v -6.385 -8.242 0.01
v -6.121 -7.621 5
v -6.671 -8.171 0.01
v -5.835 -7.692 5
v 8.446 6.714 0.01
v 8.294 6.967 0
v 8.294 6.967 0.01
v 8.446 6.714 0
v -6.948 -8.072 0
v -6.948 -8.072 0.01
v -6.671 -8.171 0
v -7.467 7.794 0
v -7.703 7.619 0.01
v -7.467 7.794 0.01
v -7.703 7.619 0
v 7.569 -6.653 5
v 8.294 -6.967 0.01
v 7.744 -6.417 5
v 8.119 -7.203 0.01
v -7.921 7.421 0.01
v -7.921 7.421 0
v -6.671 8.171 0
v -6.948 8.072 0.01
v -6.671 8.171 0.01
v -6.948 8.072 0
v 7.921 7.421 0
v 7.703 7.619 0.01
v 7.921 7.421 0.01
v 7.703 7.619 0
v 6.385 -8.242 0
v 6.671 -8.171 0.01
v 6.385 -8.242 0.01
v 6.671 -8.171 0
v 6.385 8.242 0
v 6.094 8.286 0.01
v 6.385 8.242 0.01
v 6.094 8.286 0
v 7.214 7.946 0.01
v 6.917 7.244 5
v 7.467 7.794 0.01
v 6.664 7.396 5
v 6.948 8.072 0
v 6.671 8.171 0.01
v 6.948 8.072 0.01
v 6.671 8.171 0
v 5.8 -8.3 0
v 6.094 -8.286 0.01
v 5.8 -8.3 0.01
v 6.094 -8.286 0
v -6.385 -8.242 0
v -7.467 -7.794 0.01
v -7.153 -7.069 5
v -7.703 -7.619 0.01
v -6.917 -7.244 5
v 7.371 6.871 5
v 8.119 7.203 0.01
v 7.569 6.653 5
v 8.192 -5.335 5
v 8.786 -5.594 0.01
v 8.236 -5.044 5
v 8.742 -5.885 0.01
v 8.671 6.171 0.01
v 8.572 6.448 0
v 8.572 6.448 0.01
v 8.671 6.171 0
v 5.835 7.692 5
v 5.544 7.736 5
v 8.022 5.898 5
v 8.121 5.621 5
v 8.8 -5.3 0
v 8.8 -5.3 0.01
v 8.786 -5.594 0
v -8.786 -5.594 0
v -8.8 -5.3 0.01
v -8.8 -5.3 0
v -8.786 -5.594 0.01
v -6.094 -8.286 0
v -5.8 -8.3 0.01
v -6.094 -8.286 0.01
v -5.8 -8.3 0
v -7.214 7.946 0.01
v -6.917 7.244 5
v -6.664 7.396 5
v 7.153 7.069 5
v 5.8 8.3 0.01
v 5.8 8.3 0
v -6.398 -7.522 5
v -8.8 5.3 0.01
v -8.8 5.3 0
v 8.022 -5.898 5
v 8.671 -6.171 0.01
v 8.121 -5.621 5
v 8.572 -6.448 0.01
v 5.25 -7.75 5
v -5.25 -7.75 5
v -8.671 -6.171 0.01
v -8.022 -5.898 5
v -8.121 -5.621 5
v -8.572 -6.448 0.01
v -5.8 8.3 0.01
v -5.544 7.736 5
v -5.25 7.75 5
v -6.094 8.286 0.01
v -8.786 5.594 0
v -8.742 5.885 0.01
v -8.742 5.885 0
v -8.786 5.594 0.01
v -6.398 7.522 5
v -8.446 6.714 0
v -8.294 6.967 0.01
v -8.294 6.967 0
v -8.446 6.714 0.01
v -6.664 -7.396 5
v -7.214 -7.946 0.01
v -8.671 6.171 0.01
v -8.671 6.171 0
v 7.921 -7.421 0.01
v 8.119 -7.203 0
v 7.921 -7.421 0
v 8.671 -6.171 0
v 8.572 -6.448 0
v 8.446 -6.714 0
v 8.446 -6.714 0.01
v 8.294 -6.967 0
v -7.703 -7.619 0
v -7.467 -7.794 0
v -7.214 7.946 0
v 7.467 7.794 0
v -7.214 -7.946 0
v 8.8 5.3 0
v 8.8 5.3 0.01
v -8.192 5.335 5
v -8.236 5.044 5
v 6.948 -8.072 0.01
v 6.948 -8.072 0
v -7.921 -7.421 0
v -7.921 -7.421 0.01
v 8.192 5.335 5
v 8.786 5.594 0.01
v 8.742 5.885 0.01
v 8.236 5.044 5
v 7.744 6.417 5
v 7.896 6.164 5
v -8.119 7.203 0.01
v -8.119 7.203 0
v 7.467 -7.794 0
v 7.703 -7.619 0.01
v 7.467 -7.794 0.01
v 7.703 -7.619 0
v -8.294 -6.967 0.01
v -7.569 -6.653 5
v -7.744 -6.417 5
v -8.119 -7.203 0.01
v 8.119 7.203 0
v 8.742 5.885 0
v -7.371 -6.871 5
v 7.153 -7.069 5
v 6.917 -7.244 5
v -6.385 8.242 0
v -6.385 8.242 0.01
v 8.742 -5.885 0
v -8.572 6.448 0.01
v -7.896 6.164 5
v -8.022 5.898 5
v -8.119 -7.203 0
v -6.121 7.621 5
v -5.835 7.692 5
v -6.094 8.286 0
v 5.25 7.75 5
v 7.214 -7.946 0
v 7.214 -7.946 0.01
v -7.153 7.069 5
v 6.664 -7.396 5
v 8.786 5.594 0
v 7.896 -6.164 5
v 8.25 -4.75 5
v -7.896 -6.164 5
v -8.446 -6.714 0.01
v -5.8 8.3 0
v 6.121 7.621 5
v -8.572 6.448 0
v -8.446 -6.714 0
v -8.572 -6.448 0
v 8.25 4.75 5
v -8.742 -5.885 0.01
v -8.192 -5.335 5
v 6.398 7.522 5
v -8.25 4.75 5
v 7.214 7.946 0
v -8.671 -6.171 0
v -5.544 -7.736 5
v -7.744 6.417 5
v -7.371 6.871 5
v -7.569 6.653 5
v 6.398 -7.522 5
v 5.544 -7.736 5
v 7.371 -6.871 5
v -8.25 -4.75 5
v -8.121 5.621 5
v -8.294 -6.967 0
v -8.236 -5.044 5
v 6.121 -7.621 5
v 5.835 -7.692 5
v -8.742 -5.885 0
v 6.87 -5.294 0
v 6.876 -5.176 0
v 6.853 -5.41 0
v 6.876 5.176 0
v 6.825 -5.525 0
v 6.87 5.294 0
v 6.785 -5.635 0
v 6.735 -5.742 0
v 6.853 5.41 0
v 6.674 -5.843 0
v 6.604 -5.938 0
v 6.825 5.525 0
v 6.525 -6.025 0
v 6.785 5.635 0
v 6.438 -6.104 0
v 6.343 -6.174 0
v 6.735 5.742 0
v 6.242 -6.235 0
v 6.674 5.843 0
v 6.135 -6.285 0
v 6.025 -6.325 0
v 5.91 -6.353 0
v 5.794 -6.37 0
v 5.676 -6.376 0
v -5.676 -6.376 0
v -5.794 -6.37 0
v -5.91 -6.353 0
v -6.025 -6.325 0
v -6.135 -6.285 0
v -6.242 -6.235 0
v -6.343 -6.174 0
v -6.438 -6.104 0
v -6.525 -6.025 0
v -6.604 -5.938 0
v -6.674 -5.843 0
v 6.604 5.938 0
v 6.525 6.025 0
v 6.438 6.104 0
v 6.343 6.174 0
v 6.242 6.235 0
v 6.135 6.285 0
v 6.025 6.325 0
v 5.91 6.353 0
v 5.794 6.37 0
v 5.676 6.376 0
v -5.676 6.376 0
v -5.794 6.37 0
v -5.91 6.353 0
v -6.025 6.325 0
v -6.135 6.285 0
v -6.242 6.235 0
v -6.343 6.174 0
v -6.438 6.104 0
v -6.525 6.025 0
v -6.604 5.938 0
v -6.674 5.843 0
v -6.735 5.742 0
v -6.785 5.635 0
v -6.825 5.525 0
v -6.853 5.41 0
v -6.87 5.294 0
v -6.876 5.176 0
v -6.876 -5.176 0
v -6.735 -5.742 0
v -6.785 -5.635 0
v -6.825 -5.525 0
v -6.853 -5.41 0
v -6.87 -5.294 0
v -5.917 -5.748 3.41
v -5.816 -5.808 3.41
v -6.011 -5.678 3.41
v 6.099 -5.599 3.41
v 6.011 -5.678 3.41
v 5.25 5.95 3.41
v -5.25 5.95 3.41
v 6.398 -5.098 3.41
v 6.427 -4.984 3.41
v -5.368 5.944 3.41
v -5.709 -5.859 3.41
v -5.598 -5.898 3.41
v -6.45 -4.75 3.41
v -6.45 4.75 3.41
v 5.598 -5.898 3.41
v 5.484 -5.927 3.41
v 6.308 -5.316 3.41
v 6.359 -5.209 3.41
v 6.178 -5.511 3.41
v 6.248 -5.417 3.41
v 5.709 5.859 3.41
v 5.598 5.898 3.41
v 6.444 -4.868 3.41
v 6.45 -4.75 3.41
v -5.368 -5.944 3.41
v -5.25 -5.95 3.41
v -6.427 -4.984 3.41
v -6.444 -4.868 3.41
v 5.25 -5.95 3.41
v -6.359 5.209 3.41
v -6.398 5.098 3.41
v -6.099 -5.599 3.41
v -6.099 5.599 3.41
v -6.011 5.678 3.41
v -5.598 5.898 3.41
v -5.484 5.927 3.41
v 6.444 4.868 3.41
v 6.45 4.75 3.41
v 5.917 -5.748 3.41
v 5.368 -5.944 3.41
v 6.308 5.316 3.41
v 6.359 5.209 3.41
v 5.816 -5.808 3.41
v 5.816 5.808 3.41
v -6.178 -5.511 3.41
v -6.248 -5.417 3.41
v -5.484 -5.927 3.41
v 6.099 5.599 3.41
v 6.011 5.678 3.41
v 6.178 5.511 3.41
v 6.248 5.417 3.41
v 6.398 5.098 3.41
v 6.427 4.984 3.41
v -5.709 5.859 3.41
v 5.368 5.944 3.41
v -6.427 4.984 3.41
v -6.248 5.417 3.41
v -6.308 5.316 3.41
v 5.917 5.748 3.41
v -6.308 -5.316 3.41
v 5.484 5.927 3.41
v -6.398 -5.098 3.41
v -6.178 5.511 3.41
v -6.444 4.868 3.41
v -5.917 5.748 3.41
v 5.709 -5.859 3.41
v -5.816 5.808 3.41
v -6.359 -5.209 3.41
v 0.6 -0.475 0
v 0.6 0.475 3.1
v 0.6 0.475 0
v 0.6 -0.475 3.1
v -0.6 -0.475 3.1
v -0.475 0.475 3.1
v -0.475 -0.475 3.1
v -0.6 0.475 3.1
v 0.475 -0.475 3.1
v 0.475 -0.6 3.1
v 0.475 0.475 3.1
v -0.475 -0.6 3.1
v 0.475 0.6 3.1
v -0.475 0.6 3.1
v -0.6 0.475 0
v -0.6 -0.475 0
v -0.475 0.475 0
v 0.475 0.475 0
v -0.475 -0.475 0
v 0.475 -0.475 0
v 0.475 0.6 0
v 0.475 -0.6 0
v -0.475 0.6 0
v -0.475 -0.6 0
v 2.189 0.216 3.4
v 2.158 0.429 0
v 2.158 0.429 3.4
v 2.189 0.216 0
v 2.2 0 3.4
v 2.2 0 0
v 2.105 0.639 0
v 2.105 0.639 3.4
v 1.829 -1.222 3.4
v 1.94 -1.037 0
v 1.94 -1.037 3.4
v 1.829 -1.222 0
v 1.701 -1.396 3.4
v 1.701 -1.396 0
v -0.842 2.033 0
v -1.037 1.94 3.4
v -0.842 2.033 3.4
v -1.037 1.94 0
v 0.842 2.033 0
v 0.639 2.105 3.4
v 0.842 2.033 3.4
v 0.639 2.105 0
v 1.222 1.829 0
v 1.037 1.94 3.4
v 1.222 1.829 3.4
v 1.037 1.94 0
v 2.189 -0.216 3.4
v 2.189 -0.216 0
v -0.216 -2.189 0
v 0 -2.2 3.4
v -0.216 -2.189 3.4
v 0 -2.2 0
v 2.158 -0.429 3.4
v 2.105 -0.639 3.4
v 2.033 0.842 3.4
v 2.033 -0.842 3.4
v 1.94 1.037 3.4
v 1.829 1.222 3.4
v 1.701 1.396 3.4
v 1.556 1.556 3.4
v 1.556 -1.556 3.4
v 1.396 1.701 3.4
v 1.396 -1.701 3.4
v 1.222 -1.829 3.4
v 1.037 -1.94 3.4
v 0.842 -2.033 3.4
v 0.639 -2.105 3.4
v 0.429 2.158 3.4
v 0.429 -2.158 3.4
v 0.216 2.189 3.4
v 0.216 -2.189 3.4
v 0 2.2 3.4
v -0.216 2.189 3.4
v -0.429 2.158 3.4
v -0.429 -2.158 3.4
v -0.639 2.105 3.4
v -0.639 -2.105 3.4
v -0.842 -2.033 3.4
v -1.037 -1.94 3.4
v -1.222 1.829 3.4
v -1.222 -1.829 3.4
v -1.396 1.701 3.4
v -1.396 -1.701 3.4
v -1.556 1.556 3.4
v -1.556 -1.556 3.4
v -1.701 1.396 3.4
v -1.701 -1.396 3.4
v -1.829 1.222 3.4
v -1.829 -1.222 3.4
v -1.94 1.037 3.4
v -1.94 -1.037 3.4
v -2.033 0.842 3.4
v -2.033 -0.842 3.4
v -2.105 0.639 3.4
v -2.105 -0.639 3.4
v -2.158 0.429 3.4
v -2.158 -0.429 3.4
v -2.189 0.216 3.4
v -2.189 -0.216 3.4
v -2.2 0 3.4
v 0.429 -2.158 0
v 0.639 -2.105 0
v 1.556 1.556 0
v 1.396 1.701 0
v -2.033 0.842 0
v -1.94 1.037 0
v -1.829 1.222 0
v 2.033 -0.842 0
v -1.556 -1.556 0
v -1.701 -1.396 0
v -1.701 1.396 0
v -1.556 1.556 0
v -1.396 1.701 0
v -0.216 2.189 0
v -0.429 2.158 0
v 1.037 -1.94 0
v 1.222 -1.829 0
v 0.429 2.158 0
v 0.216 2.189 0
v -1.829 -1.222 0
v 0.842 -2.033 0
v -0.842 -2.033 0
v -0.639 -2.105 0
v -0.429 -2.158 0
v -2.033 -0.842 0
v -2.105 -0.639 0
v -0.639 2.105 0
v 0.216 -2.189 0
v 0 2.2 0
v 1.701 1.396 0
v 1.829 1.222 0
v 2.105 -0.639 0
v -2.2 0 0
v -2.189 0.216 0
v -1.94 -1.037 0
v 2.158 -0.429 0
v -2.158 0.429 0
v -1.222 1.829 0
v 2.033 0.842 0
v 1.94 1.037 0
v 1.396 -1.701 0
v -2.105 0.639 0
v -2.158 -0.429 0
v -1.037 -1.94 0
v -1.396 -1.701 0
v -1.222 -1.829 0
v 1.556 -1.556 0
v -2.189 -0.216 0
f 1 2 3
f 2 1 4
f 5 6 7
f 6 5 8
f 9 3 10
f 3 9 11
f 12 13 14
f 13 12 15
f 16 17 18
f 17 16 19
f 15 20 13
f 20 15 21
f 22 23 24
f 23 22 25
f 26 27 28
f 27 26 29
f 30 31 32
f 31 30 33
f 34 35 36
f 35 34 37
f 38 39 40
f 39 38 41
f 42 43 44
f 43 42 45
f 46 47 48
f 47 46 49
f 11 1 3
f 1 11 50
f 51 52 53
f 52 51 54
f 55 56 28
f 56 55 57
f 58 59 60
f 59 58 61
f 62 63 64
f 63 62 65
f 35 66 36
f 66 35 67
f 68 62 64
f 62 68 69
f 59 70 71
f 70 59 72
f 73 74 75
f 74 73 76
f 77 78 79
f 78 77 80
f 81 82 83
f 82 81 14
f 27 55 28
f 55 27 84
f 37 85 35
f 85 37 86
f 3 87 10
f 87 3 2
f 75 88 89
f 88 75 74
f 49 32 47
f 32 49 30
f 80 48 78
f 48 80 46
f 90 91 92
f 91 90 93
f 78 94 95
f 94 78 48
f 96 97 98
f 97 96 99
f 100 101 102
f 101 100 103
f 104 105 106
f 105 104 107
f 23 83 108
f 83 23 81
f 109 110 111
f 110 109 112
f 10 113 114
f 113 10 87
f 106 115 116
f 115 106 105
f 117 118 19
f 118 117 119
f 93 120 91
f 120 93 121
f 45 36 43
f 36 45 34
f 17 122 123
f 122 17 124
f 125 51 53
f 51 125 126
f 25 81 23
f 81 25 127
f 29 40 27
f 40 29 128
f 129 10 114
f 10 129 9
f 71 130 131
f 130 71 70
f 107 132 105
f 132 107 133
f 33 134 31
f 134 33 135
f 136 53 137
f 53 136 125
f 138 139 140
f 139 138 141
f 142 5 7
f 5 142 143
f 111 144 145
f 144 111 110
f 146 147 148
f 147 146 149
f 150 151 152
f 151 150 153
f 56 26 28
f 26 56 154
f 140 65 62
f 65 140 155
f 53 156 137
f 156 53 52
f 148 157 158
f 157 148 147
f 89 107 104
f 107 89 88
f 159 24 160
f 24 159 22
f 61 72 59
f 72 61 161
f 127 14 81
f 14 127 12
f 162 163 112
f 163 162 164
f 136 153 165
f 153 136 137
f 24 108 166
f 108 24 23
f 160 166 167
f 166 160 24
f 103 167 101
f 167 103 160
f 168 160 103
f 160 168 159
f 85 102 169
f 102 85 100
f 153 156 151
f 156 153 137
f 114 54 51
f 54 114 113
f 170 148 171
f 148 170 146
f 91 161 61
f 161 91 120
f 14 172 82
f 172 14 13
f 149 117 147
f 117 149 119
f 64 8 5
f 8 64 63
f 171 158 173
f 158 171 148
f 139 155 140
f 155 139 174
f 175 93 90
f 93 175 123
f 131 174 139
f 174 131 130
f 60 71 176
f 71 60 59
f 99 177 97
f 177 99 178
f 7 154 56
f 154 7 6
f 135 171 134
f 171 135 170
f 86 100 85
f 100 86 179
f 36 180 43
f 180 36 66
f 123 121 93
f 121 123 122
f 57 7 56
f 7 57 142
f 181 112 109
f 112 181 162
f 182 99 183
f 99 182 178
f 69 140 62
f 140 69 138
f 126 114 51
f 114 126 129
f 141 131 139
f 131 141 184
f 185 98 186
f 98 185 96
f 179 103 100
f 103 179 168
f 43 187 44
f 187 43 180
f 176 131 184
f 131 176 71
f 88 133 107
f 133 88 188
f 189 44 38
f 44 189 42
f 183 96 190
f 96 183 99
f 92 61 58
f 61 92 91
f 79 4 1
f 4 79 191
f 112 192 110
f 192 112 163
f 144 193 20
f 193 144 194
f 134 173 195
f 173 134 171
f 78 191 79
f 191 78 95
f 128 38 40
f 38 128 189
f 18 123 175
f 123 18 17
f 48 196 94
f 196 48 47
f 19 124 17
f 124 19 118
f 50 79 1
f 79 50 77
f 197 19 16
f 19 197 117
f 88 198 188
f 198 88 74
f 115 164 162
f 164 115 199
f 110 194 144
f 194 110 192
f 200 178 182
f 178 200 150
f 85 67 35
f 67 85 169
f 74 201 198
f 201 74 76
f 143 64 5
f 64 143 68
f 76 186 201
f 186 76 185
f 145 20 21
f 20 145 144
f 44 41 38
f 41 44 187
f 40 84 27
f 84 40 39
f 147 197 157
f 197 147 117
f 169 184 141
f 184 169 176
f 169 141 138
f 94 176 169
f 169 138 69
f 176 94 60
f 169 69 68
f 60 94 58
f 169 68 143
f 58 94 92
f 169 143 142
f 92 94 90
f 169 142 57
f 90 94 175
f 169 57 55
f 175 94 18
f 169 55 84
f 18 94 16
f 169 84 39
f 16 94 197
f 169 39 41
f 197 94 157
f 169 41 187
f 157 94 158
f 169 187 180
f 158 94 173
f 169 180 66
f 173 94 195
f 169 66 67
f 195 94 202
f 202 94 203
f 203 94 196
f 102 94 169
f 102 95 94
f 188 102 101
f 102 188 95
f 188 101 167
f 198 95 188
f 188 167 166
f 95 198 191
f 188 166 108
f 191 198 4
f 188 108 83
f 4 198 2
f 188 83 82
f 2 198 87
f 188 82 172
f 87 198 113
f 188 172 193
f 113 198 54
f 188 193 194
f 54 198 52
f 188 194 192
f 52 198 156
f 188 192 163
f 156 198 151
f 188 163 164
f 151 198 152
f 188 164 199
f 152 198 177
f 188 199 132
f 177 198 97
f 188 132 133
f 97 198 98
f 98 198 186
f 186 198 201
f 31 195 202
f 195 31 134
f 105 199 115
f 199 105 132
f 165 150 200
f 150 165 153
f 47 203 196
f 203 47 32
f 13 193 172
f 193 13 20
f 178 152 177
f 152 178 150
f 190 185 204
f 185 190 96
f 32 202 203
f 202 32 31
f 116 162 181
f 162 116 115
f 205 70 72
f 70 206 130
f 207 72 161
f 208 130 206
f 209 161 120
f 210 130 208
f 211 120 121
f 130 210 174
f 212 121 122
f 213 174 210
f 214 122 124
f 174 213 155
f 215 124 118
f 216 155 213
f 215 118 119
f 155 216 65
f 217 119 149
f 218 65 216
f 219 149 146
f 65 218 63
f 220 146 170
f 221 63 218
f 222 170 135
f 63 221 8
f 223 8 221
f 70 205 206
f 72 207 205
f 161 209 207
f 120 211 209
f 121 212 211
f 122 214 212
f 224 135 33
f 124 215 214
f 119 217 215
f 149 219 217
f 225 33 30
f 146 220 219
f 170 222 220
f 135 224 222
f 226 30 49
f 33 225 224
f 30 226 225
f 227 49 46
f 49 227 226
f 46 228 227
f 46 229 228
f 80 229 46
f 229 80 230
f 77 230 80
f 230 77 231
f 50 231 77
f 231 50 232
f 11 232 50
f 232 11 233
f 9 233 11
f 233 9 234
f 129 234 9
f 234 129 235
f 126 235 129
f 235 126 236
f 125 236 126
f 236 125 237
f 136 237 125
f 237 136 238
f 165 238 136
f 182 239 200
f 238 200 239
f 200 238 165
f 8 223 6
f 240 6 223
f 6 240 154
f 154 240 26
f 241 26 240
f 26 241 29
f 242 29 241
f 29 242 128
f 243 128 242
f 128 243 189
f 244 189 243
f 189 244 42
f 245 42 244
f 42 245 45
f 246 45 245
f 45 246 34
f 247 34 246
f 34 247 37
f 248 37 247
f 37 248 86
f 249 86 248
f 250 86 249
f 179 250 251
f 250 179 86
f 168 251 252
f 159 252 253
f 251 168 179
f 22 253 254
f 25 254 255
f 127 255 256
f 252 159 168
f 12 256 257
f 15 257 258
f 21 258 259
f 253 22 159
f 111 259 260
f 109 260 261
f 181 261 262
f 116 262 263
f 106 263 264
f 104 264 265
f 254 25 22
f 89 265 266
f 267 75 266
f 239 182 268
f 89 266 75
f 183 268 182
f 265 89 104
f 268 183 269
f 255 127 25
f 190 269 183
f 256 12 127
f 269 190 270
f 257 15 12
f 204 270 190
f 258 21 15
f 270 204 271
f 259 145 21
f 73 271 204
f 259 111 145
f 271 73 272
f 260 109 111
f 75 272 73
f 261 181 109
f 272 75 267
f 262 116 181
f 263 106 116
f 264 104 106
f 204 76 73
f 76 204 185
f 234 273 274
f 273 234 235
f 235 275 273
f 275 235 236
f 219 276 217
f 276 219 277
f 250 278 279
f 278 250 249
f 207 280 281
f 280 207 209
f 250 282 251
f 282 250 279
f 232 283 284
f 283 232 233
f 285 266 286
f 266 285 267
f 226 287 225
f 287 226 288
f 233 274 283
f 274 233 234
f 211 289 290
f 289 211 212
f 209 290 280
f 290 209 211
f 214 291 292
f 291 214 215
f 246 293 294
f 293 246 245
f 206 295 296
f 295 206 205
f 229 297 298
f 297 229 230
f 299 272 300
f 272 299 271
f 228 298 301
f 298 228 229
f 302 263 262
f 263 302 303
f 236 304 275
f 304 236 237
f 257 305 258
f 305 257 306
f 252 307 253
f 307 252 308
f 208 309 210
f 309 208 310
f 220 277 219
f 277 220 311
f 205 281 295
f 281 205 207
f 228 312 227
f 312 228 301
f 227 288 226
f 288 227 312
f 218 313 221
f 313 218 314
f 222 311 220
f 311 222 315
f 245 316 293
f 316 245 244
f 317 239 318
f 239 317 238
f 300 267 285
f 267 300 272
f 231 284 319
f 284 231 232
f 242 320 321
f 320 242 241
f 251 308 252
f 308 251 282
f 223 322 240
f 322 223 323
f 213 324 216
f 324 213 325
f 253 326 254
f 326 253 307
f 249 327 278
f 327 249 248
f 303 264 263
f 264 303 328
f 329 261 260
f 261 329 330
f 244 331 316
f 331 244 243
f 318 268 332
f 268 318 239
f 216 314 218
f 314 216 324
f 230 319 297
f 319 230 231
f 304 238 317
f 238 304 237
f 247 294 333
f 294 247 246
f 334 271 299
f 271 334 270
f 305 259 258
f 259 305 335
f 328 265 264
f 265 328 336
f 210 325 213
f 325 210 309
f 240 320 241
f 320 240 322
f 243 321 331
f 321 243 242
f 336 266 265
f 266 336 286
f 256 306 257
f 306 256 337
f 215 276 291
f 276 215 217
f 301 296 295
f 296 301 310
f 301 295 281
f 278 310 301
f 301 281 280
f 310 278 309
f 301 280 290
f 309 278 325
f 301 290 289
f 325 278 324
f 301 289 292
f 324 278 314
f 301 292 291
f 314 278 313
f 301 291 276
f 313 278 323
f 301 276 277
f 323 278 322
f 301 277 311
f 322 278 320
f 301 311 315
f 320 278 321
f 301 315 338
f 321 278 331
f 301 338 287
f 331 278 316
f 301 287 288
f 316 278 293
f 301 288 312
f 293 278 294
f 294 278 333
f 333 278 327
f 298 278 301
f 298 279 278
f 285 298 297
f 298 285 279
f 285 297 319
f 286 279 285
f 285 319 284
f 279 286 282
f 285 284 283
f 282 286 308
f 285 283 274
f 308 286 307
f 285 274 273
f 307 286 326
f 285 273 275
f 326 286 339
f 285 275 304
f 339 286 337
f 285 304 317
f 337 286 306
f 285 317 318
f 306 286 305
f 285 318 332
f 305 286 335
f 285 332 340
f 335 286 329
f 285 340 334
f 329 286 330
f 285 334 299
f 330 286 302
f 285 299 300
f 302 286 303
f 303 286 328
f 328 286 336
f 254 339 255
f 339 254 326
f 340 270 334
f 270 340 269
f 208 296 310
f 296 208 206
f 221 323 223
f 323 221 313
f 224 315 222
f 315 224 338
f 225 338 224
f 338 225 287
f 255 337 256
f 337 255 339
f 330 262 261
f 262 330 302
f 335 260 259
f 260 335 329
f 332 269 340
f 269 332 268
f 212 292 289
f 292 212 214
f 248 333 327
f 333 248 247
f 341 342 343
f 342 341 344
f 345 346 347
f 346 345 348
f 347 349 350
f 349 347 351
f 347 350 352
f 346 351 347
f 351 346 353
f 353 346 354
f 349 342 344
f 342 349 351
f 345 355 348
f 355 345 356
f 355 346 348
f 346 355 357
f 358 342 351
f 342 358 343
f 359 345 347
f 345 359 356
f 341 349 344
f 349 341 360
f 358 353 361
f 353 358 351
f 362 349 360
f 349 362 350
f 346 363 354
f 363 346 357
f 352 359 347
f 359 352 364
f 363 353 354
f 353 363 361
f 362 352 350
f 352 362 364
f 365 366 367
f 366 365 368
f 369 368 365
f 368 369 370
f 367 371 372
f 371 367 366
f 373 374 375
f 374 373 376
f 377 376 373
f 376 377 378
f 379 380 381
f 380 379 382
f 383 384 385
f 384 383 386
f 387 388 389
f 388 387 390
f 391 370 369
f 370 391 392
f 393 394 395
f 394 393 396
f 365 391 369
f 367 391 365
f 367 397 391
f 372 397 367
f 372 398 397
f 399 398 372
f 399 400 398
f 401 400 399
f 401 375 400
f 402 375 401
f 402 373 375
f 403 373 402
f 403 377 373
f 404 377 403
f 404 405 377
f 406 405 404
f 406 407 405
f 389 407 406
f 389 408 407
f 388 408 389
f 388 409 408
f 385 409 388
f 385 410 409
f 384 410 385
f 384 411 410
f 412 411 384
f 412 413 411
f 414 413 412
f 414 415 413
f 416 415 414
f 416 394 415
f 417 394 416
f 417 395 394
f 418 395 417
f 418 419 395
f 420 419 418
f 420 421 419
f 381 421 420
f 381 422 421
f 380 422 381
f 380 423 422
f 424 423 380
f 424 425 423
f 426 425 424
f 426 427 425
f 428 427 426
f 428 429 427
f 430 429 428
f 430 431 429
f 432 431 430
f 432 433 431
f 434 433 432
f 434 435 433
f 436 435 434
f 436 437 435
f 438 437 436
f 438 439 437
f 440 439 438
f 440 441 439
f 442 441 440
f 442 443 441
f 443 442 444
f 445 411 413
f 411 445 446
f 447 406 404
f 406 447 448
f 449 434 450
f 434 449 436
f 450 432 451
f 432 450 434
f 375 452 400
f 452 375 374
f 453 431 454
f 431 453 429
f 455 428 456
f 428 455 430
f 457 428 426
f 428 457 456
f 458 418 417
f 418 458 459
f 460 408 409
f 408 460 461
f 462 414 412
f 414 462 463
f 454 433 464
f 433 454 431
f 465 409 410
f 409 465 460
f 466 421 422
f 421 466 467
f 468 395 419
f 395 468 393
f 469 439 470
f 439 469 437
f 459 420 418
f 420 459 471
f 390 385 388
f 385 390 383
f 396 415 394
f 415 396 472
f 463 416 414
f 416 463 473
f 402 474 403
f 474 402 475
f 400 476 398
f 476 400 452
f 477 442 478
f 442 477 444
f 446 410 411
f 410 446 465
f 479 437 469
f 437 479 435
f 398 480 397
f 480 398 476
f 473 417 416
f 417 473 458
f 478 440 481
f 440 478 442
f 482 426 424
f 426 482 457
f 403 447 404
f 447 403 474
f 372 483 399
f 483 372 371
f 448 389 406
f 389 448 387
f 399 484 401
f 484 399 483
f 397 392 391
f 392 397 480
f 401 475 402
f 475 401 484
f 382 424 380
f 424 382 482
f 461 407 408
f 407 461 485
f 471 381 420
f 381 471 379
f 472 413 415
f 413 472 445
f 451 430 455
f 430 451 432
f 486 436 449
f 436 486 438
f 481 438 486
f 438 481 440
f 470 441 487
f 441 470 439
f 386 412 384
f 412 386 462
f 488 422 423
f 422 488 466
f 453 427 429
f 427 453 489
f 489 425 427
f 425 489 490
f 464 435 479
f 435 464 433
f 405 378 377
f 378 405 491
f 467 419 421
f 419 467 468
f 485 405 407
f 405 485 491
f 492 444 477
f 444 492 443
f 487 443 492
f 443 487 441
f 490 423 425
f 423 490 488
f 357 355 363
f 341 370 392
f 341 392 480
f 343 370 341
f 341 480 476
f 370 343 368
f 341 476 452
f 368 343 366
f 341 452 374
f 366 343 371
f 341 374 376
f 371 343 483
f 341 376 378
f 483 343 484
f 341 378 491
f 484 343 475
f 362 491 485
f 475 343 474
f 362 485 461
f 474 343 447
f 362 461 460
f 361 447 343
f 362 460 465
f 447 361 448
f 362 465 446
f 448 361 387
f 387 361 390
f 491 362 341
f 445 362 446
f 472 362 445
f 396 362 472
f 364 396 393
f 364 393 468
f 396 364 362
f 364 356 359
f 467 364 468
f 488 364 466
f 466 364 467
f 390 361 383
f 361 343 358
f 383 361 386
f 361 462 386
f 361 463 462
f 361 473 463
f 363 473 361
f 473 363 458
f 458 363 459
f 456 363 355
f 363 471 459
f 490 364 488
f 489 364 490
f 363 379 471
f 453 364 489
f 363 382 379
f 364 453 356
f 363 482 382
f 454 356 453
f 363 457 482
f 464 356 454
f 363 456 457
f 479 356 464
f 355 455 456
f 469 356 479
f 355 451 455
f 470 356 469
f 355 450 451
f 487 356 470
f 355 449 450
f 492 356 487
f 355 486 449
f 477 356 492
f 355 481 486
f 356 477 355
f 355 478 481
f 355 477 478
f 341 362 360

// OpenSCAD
// file: parts.scad
// =============================================================================
// ClaudePad · 零件模块（由 params.scad 提供尺寸）
// =============================================================================

// ---- 底座 -------------------------------------------------------------------
module case_shell() {
    difference() {
        translate([CASE_W / 2, CASE_D / 2, 0])
            linear_extrude(height = CASE_H)
                rrect(CASE_W, CASE_D, CASE_RADIUS);

        translate([CASE_W / 2, CASE_D / 2, CASE_BOTTOM_T])
            linear_extrude(height = CASE_H + 1)
                rrect(CASE_W - 2 * CASE_WALL, CASE_D - 2 * CASE_WALL,
                      CASE_RADIUS - CASE_WALL);

        translate([XIAO_RECESS_X0, XIAO_RECESS_Y0, XIAO_RECESS_Z0])
            cube([XIAO_RECESS_X1 - XIAO_RECESS_X0,
                  XIAO_RECESS_Y1 - XIAO_RECESS_Y0,
                  XIAO_RECESS_Z1 - XIAO_RECESS_Z0]);

        translate([USB_SLOT_X0, -0.1, USB_SLOT_Z0])
            cube([USB_SLOT_X1 - USB_SLOT_X0, 1.6,
                  USB_SLOT_Z1 - USB_SLOT_Z0]);

        for (f = FOOT_POS)
            translate([f[0], f[1], -0.1]) cylinder(d = 8.0, h = 1.2);
    }
}

module plate_ledges() {
    z0 = PLATE_BOT_Z - PLATE_T;
    translate([CASE_WALL - 0.5, PLATE_Y0, z0])
        cube([2.5, PLATE_D, PLATE_T]);
    translate([CASE_W - CASE_WALL - 2.0, PLATE_Y0, z0])
        cube([2.5, PLATE_D, PLATE_T]);
    translate([CASE_WALL, CASE_D - CASE_WALL - 2.0, z0])
        cube([CASE_W - 2 * CASE_WALL, 2.5, PLATE_T]);
}

module screw_posts() {
    for (p = SCREW_POS)
        translate([p[0], p[1], CASE_BOTTOM_T - 0.5])
            cylinder(d = POST_D, h = PLATE_BOT_Z - CASE_BOTTOM_T + 0.5);
}

module pcb_supports() {
    for (p = SUPPORT_POS)
        translate([p[0], p[1], CASE_BOTTOM_T - 0.5])
            cylinder(d = SUPPORT_D, h = SUPPORT_H + 0.5);
}

module battery_walls() {
    z0 = CASE_BOTTOM_T - 0.5;
    h = BATT_WALL_H + 0.5;
    // 左
    translate([BATT_X0 - 2.0, BATT_Y0 - 1.5, z0])
        cube([BATT_WALL, BATT_L + 3.0, h]);
    // 右（中间留走线缺口）
    translate([BATT_X0 + BATT_W + 0.4, BATT_Y0 - 1.5, z0])
        cube([BATT_WALL, 12.5, h]);
    translate([BATT_X0 + BATT_W + 0.4, BATT_Y0 + 14.5, z0])
        cube([BATT_WALL, BATT_L - 10.0, h]);
    // 后
    translate([BATT_X0 - 2.0, BATT_Y0 - 1.5, z0])
        cube([BATT_W + 4.0, BATT_WALL, h]);
    // 前
    translate([BATT_X0 - 2.0, BATT_Y0 + BATT_L, z0])
        cube([BATT_W + 4.0, BATT_WALL, h]);
}

module case_bottom() {
    difference() {
        union() {
            case_shell();
            plate_ledges();
            screw_posts();
            pcb_supports();
            battery_walls();
        }
        for (p = SCREW_POS)
            translate([p[0], p[1], 7.0])
                cylinder(d = PILOT_D, h = PLATE_BOT_Z - 7.0 + 0.2);
    }
}

// ---- 定位板 -----------------------------------------------------------------
module plate() {
    difference() {
        translate([PLATE_X0 + PLATE_W / 2, PLATE_Y0 + PLATE_D / 2, PLATE_BOT_Z])
            linear_extrude(height = PLATE_T)
                rrect(PLATE_W, PLATE_D, PLATE_RADIUS);

        for (s = SWITCHES)
            translate([s[0], s[1], PLATE_BOT_Z + PLATE_T / 2])
                choc_cutout();

        for (p = SCREW_POS)
            translate([p[0], p[1], PLATE_BOT_Z - 1])
                cylinder(d = SCREW_CLEAR, h = PLATE_T + 2);
    }
}

// ---- 键帽 -------------------------------------------------------------------
module cross_stem_socket() {
    union() {
        translate([-CAP_STEM_W / 2, -CAP_STEM_GAP / 2, 0])
            cube([CAP_STEM_W, CAP_STEM_GAP, CAP_STEM_DEPTH]);
        translate([-CAP_STEM_GAP / 2, -CAP_STEM_W / 2, 0])
            cube([CAP_STEM_GAP, CAP_STEM_W, CAP_STEM_DEPTH]);
    }
}

module cap_shell(u) {
    outer_w = PITCH_X * u - 0.4;
    outer_d = PITCH_Y - 0.4;
    top_w = outer_w - CAP_TAPER * 2;
    top_d = outer_d - CAP_TAPER * 2;
    r_out = min(CAP_TOP_R, min(outer_w, outer_d) / 2 - 0.1);
    r_in = max(r_out - CAP_WALL, 0.2);

    difference() {
        hull() {
            linear_extrude(height = 0.01) rrect(outer_w, outer_d, r_out);
            translate([0, 0, CAP_H - CAP_TOP_T])
                linear_extrude(height = CAP_TOP_T) rrect(top_w, top_d, r_out);
        }
        hull() {
            translate([0, 0, -1])
                linear_extrude(height = 0.01)
                    rrect(outer_w - CAP_WALL * 2, outer_d - CAP_WALL * 2, r_in);
            translate([0, 0, CAP_H - CAP_TOP_T])
                linear_extrude(height = 0.01)
                    rrect(top_w - CAP_WALL * 2, top_d - CAP_WALL * 2, r_in);
        }
    }
}

module stem_boss() {
    h = CAP_H - CAP_TOP_T;
    difference() {
        cylinder(d = CAP_STEM_W * 2 + 2.0, h = h);
        translate([0, 0, -0.5]) cross_stem_socket();
    }
}

module cap_ribs(u) {
    if (u >= 2) {
        outer_w = PITCH_X * u - 0.4;
        outer_d = PITCH_Y - 0.4;
        n = (u == 2) ? CAP_RIB_COUNT_MED : CAP_RIB_COUNT_LONG;
        for (i = [1 : n]) {
            translate([
                -outer_w / 2 + outer_w * i / (n + 1) - CAP_RIB_T / 2,
                -outer_d / 2 + CAP_WALL,
                0
            ]) cube([CAP_RIB_T, outer_d - CAP_WALL * 2, CAP_H - CAP_TOP_T]);
        }
    }
}

module keycap(u = 1) {
    union() {
        cap_shell(u);
        for (i = [0 : axis_count(u) - 1])
            translate([stem_offset(u, i), 0, 0]) stem_boss();
        cap_ribs(u);
    }
}
// file: params.scad
// =============================================================================
// ClaudePad · 全局参数（PCB / 定位板 / 外壳 / 键帽共用）
// 单位：mm；坐标与 pcb/generate_pcb.py 完全一致（绝对坐标）
// =============================================================================

// ---- PCB / 按键网格 ---------------------------------------------------------
PCB_X0 = 9.0;
PCB_Y0 = 3.0;
PCB_W = 90.0;
PCB_D = 76.0;
PCB_T = 1.6;
PCB_TOP_Z = 8.6;          // 底板 2.0 + 支撑 5.0 + PCB 1.6
PCB_BOT_Z = 7.0;

PITCH_X = 18.0;
PITCH_Y = 17.0;
KEY_X = [18.0, 36.0, 54.0, 72.0, 90.0];
KEY_Y = [30.5, 47.5, 64.5];

// 14 个实体轴位（ENTER/Space 多轴并联）
SWITCHES = [
    [18.0, 30.5], [36.0, 30.5], [54.0, 30.5], [72.0, 30.5], [90.0, 30.5],
    [18.0, 47.5], [54.0, 47.5], [72.0, 47.5], [90.0, 47.5],
    [18.0, 64.5], [36.0, 64.5], [54.0, 64.5], [72.0, 64.5], [90.0, 64.5]
];

// 11 个键帽：[cx, cy, 宽度u, 名称]
KEYCAPS = [
    [18.0, 30.5, 1, "PERM"], [36.0, 30.5, 1, "MODEL"], [54.0, 30.5, 1, "CMD"],
    [72.0, 30.5, 1, "UP"], [90.0, 30.5, 1, "VOICE"],
    [18.0, 47.5, 1, "STOP"], [54.0, 47.5, 1, "LEFT"], [72.0, 47.5, 1, "DOWN"],
    [90.0, 47.5, 1, "RIGHT"],
    [27.0, 64.5, 2, "ENTER"], [72.0, 64.5, 3, "SPACE"]
];

// ---- 轴体 / 定位板 ---------------------------------------------------------
SWITCH_CUTOUT = 14.5;     // Choc V2 方孔（kiswitch footprint Eco1.User = 14.5）
SWITCH_CUTOUT_TOL = 0.1;
SWITCH_CLIP_W = 2.6;      // 侧卡扣槽
SWITCH_CLIP_H = 1.9;
SWITCH_TRAVEL = 3.0;
SWITCH_TOP_ABOVE_PCB = 8.0; // 轴芯顶面相对 PCB 顶部

PLATE_T = 1.2;
PLATE_X0 = 3.0;
PLATE_Y0 = 22.0;
PLATE_W = 102.0;
PLATE_D = 57.0;
PLATE_RADIUS = 3.0;

// PCB 顶面 → 定位板底面。唯一需要实物校准的参数。
// 先打印 test_coupon.scad，实测 3.50 / 4.25 / 5.00 哪个最贴合。
SWITCH_PLATE_GAP = 5.0;
PLATE_BOT_Z = PCB_TOP_Z + SWITCH_PLATE_GAP;   // 13.6
PLATE_TOP_Z = PLATE_BOT_Z + PLATE_T;          // 14.8

// ---- 外壳 -------------------------------------------------------------------
CASE_W = 108.0;
CASE_D = 82.0;
CASE_WALL = 2.4;
CASE_BOTTOM_T = 2.0;
CASE_RADIUS = 3.0;
CASE_H = PLATE_TOP_Z;                          // 14.8（定位板顶面与外沿齐平）

SCREW_POS = [[6.0, 25.0], [102.0, 25.0], [6.0, 76.0], [102.0, 76.0]];
SCREW_CLEAR = 2.3;
POST_D = 5.0;
PILOT_D = 1.7;

SUPPORT_POS = [[27.0, 39.0], [81.0, 39.0], [27.0, 56.0], [81.0, 56.0]];
SUPPORT_D = 4.0;
SUPPORT_H = PCB_BOT_Z - CASE_BOTTOM_T;         // 5.0

FOOT_POS = [[10.0, 8.0], [98.0, 8.0], [10.0, 74.0], [98.0, 74.0]];

// ---- 电池仓（PCB 下方）------------------------------------------------------
// 电池放在控制器仓下方（PCB 下面），避开键区背面的 DO-35 二极管
BATT_W = 30.0;
BATT_L = 20.0;
BATT_H = 3.0;             // 302030 锂电，带保护板
BATT_X0 = 10.0;
BATT_Y0 = 3.0;
BATT_WALL = 1.6;
BATT_WALL_H = 4.0;        // 1.5..6.0，PCB 底面 7.0，留 1.0

// ---- XIAO / 电池连接器 ------------------------------------------------------
XIAO_X = 54.0;
XIAO_Y = 12.0;
XIAO_W = 21.0;
XIAO_D = 17.8;
XIAO_H = 3.2;
// XIAO 用 2x7 2.54mm 排针穿孔安装，模块被抬高 HEADER_H。
// PCB 顶面 8.6 + 2.5 = 模块底面 11.1；USB-C 中心约 12.7。
HEADER_H = 2.5;
XIAO_RECESS_X0 = 42.0;
XIAO_RECESS_X1 = 66.0;
XIAO_RECESS_Y0 = 1.4;
XIAO_RECESS_Y1 = 2.6;
XIAO_RECESS_Z0 = 10.5;
XIAO_RECESS_Z1 = 14.3;
USB_SLOT_X0 = 48.5;
USB_SLOT_X1 = 59.5;
USB_SLOT_Z0 = 10.5;
USB_SLOT_Z1 = 14.3;

JST_X = 74.0;
JST_Y = 12.0;
CABLE_SLOT = [83.5, 10.0, 87.5, 18.0];

// ---- 键帽 -------------------------------------------------------------------
CAP_GAP = 3.3;            // 定位板顶面 → 键帽裙边底面（≥ SWITCH_TRAVEL）
CAP_H = 5.0;
CAP_WALL = 1.8;
CAP_TOP_T = 1.6;
CAP_TAPER = 0.55;
CAP_STEM_W = 1.2;
CAP_STEM_GAP = 0.95;
CAP_STEM_DEPTH = 3.6;
CAP_TOP_R = 3.0;
CAP_RIB_T = 1.2;
CAP_RIB_COUNT_MED = 1;
CAP_RIB_COUNT_LONG = 3;

TOTAL_H = PLATE_TOP_Z + CAP_GAP + CAP_H;       // 23.1

$fn = 64;

// ---- 通用函数 ---------------------------------------------------------------
module rrect(w, d, r) {
    offset(r = r) offset(delta = -r) square([w, d], center = true);
}

function axis_count(u) = (u <= 1) ? 1 : ((u == 2) ? 2 : 3);

function stem_offset(u, i) =
    (axis_count(u) <= 1) ? 0 : (i - (axis_count(u) - 1) / 2) * PITCH_X;

module choc_cutout() {
    s = SWITCH_CUTOUT + SWITCH_CUTOUT_TOL;
    linear_extrude(height = PLATE_T + 2, center = true) {
        square([s, s], center = true);
        for (sx = [-1, 1]) {
            translate([sx * (s / 2 + SWITCH_CLIP_H / 2), 0])
                square([SWITCH_CLIP_H * 2, SWITCH_CLIP_W], center = true);
        }
    }
}
// main file
// ClaudePad 键帽：1u / 2u / 3u
// 单规格导出请用包装文件：
//   openscad -o keycap_2u.stl keycap_2u.scad
// （本文件默认 1u；OpenSCAD 2021 的 -D 变量在部分环境不生效，故用包装文件）
include <params.scad>
include <parts.scad>

KC_U = is_undef(KEYCAP_U) ? 1 : KEYCAP_U;
keycap(KC_U);

echo(str("键帽 = ", KC_U, "u｜高 ", CAP_H, " mm｜裙边间隙 ", CAP_GAP, " mm"));
echo("打印方向：顶面朝下倒扣，榫槽朝上；层高 0.12，无需支撑。");
